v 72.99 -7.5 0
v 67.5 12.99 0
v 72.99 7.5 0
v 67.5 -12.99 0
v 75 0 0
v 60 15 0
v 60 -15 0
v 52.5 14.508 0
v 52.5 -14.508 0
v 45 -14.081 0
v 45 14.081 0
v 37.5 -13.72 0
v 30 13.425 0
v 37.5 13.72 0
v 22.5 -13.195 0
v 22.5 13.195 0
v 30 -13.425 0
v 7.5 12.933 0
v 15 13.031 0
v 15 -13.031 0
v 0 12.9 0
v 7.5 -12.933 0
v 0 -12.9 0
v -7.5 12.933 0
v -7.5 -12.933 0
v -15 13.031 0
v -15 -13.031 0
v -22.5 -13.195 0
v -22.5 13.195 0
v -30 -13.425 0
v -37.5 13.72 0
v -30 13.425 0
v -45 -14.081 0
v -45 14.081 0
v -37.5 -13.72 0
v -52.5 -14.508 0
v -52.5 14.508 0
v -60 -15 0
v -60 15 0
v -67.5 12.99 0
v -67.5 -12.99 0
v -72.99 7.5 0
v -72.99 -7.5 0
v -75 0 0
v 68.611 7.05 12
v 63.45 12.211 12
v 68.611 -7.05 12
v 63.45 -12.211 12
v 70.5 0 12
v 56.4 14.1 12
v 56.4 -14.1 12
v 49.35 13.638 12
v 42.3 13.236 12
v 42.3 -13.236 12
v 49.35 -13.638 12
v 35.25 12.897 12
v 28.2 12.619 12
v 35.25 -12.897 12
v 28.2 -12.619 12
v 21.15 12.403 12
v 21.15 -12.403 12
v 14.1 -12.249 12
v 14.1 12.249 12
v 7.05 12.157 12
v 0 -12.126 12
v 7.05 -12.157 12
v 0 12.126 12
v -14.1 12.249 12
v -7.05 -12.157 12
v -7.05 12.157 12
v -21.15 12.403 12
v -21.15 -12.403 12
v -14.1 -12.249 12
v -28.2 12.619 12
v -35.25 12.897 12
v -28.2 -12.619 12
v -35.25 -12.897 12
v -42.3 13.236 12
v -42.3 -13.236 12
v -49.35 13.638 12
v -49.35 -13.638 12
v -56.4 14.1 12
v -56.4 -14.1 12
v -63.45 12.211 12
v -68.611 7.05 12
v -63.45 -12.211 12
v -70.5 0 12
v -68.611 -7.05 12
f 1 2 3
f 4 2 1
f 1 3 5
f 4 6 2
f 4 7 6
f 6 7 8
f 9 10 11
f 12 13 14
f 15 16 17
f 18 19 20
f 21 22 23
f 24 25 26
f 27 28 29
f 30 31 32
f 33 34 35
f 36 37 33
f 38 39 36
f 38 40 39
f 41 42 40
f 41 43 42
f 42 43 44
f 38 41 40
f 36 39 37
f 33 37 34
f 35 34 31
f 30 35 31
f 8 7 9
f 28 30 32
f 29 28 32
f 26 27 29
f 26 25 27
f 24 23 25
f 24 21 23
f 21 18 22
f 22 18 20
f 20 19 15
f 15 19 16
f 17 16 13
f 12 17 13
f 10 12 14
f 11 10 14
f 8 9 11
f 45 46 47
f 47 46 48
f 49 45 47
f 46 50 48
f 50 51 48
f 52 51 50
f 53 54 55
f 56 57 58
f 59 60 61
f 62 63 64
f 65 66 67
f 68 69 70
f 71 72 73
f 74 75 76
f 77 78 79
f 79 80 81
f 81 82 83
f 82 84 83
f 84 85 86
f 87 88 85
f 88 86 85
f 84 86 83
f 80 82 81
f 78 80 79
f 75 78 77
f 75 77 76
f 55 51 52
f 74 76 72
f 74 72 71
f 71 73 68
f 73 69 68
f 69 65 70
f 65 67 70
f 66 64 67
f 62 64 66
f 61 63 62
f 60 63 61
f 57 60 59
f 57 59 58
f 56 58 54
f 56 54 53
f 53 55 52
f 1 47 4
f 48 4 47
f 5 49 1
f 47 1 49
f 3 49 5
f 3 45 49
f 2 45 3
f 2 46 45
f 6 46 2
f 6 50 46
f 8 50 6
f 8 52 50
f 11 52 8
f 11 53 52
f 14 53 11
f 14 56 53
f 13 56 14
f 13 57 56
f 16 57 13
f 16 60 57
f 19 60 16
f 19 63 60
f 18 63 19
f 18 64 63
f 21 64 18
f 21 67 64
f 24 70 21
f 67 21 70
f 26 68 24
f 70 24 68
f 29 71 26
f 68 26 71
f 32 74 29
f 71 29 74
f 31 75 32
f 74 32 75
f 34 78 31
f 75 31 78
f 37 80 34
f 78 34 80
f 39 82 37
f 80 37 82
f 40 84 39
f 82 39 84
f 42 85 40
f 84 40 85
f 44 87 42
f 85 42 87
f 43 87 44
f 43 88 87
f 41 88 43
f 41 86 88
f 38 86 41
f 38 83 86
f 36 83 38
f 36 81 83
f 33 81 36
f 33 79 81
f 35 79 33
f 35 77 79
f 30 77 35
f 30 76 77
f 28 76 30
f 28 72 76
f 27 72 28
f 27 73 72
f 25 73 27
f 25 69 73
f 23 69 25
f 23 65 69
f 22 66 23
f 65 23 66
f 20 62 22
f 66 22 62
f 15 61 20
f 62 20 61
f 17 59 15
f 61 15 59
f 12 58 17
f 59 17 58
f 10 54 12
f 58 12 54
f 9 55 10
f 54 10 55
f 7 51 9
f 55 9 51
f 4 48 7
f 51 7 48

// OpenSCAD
$fn = 32;

// ----------------------------------------------------------------------
// Handle: 150 x 30 mm grip, 12 mm thick
// ----------------------------------------------------------------------

// --- parameters (mm) ---
length = 150;             // grip length
width = 30;               // grip width
thickness = 12;           // grip thickness
waist = 0.86;             // width factor at the middle
draft = 0.94;             // top face scale of the extrusion

/* ergonomic grip outline, closed spline-like polygon in the XY plane */
grip = [[-60, 15], [-52.5, 14.508], [-45, 14.081], [-37.5, 13.72], [-30, 13.425], [-22.5, 13.195], [-15, 13.031], [-7.5, 12.933], [0, 12.9], [7.5, 12.933], [15, 13.031], [22.5, 13.195], [30, 13.425], [37.5, 13.72], [45, 14.081], [52.5, 14.508], [60, 15], [67.5, 12.99], [72.99, 7.5], [75, 0], [72.99, -7.5], [67.5, -12.99], [60, -15], [60, -15], [52.5, -14.508], [45, -14.081], [37.5, -13.72], [30, -13.425], [22.5, -13.195], [15, -13.031], [7.5, -12.933], [0, -12.9], [-7.5, -12.933], [-15, -13.031], [-22.5, -13.195], [-30, -13.425], [-37.5, -13.72], [-45, -14.081], [-52.5, -14.508], [-60, -15], [-67.5, -12.99], [-72.99, -7.5], [-75, 0], [-72.99, 7.5], [-67.5, 12.99], [-60, 15]];

module grip_body() {
  linear_extrude(height = thickness, scale = draft) polygon(grip);
}

difference() {
  union() {
    grip_body();
  }
}
